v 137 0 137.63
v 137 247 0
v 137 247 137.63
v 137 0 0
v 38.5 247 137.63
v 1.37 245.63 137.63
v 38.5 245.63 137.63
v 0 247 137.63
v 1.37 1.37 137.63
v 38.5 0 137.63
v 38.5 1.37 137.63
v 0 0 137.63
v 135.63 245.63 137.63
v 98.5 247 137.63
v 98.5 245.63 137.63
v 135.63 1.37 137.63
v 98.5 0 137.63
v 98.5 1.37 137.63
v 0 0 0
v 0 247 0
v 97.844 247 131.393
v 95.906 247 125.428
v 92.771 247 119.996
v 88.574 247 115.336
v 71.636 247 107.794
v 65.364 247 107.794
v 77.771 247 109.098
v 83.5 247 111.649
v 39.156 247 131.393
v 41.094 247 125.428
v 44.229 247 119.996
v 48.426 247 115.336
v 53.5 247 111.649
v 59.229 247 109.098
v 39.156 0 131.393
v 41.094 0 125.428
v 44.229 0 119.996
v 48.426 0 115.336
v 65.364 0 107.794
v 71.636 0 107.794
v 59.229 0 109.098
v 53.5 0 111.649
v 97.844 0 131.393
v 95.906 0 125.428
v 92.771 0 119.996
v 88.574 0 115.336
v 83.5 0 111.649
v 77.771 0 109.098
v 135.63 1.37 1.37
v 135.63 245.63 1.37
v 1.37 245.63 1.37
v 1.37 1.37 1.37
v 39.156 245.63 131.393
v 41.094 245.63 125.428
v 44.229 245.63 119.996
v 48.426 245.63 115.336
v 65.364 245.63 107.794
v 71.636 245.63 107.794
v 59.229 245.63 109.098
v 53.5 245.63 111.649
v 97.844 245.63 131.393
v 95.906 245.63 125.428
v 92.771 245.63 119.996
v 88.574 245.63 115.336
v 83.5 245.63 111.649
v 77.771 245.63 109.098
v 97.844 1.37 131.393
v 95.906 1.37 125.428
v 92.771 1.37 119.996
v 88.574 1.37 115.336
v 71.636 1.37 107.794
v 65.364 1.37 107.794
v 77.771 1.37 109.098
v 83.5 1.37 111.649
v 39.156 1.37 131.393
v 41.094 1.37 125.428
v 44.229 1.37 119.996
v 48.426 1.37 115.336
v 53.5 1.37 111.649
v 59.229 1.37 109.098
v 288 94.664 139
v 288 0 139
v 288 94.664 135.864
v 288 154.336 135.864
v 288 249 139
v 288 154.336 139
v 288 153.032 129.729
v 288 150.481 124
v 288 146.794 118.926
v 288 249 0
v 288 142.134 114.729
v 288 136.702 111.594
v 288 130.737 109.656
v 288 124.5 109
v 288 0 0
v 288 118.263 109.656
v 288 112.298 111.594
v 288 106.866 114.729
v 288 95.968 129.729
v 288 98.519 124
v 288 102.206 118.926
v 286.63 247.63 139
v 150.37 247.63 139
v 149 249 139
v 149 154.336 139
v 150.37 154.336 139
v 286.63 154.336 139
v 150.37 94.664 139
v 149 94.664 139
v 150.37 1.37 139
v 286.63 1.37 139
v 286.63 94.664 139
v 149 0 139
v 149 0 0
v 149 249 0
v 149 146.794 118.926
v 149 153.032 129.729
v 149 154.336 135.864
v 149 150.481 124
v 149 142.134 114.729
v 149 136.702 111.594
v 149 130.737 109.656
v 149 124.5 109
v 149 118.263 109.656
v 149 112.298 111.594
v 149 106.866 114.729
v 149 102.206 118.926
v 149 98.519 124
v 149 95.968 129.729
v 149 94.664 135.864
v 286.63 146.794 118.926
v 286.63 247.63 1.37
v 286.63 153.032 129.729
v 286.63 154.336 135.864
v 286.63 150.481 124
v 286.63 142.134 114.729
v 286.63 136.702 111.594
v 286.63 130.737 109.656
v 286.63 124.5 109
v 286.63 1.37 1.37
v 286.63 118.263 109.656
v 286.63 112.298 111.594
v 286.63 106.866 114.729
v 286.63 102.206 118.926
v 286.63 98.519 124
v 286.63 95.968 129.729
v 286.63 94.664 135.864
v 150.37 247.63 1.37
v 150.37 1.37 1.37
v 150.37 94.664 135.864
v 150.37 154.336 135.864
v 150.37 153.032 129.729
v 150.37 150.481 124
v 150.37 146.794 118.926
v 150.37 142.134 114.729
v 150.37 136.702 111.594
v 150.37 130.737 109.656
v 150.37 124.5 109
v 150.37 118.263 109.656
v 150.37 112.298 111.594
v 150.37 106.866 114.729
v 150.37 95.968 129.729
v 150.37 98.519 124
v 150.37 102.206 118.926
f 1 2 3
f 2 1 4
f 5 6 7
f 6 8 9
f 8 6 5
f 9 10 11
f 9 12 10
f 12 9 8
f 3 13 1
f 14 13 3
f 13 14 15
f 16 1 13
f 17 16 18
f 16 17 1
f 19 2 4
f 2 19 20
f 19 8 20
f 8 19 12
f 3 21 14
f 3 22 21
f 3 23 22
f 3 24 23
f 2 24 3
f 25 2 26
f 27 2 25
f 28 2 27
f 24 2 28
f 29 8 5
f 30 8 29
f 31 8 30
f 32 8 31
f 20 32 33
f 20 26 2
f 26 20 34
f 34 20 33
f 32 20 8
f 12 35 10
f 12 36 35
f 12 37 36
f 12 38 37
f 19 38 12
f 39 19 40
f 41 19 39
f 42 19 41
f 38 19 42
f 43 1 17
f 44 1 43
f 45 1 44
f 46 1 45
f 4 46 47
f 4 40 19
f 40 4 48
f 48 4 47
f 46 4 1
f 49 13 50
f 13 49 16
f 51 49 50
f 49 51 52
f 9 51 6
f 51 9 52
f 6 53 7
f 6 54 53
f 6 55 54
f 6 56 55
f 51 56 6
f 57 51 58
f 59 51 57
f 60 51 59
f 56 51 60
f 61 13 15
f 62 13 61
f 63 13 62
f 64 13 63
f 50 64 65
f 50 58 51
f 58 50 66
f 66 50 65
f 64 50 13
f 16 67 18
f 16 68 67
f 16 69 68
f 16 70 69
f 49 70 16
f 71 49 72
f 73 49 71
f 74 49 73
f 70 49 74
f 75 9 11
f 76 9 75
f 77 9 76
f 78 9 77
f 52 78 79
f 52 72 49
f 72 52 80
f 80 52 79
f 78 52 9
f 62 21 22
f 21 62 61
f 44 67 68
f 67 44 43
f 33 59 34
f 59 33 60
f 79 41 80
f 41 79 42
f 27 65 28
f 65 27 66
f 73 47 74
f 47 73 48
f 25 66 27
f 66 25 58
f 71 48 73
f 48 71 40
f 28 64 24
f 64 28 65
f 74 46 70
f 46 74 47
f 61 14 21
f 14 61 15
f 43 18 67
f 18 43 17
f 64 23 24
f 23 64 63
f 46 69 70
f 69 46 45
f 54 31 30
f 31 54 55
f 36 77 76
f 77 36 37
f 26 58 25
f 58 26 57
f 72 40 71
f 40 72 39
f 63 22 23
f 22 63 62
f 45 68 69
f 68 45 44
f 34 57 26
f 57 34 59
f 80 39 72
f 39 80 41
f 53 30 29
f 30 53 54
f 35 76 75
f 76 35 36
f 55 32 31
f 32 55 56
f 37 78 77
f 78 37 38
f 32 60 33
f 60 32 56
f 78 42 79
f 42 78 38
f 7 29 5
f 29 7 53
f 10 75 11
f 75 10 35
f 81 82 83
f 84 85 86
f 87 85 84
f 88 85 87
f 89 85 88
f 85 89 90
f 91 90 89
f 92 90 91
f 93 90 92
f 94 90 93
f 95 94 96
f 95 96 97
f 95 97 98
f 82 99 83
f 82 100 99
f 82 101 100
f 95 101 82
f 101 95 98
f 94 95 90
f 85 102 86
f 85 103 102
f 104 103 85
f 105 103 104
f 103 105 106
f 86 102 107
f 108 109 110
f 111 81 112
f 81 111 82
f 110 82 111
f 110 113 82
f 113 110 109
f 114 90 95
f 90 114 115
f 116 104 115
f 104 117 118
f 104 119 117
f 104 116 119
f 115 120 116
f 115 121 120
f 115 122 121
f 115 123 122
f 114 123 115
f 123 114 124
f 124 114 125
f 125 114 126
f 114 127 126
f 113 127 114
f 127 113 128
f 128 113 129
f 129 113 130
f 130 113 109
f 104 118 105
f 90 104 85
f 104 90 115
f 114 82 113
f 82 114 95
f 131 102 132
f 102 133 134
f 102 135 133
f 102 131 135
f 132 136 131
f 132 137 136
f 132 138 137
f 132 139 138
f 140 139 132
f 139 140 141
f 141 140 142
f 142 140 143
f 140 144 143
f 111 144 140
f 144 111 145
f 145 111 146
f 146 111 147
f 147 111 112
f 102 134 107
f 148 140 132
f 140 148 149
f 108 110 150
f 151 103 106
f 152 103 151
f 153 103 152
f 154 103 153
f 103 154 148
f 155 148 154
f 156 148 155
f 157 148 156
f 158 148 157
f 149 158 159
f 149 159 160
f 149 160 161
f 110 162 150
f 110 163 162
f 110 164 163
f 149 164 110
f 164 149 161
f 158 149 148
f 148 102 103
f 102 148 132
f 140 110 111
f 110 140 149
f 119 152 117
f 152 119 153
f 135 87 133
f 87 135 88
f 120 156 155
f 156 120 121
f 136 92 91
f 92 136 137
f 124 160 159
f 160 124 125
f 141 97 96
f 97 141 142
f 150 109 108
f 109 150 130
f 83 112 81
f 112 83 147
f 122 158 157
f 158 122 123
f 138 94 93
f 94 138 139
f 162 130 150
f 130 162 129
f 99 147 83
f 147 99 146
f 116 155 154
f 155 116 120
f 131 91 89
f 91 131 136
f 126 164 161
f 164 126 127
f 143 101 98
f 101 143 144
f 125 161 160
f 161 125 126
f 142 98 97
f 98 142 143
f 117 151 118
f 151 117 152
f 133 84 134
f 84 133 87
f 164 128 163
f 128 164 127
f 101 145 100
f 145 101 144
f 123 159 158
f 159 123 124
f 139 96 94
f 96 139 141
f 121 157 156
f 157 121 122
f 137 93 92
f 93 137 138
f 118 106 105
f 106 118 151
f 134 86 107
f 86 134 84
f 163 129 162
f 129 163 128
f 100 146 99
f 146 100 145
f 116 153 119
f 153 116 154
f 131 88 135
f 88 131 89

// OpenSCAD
generate_lid=true;
generate_box=true;

length=249;
width=139;
height=139;
wall_thickness=1.37;
cutout_size=30;
clearance=1;


//inside box
if(generate_box) {
    inside_box_length=length-2*clearance;
    inside_box_width=width-2*clearance;
    inside_box_height=height-wall_thickness;
    difference() {
        difference() {
            cube([inside_box_width,inside_box_length,inside_box_height]);
            translate(wall_thickness*[1,1,1]) cube([inside_box_width,inside_box_length,inside_box_height+wall_thickness] - 2*wall_thickness*[1,1,1]);
        }
        translate([inside_box_width/2,inside_box_length+1,inside_box_height])  rotate(a=90, v=[1,0,0]) cylinder(r1=cutout_size,r2=cutout_size,h=inside_box_length+2);
    }
}

//lid
if(generate_lid) {
    translate([generate_box ? width+10 : 0,0,0]){
        difference() {
            difference() {
                cube([width,length,height]);
                translate(wall_thickness*[1,1,1]) cube([width,length,height+wall_thickness] - 2*wall_thickness*[1,1,1]);
            }
            translate([-1,length/2,height])  rotate(a=90, v=[0,1,0]) cylinder(r1=cutout_size,r2=cutout_size,h=width+2);
        }
    }
}
